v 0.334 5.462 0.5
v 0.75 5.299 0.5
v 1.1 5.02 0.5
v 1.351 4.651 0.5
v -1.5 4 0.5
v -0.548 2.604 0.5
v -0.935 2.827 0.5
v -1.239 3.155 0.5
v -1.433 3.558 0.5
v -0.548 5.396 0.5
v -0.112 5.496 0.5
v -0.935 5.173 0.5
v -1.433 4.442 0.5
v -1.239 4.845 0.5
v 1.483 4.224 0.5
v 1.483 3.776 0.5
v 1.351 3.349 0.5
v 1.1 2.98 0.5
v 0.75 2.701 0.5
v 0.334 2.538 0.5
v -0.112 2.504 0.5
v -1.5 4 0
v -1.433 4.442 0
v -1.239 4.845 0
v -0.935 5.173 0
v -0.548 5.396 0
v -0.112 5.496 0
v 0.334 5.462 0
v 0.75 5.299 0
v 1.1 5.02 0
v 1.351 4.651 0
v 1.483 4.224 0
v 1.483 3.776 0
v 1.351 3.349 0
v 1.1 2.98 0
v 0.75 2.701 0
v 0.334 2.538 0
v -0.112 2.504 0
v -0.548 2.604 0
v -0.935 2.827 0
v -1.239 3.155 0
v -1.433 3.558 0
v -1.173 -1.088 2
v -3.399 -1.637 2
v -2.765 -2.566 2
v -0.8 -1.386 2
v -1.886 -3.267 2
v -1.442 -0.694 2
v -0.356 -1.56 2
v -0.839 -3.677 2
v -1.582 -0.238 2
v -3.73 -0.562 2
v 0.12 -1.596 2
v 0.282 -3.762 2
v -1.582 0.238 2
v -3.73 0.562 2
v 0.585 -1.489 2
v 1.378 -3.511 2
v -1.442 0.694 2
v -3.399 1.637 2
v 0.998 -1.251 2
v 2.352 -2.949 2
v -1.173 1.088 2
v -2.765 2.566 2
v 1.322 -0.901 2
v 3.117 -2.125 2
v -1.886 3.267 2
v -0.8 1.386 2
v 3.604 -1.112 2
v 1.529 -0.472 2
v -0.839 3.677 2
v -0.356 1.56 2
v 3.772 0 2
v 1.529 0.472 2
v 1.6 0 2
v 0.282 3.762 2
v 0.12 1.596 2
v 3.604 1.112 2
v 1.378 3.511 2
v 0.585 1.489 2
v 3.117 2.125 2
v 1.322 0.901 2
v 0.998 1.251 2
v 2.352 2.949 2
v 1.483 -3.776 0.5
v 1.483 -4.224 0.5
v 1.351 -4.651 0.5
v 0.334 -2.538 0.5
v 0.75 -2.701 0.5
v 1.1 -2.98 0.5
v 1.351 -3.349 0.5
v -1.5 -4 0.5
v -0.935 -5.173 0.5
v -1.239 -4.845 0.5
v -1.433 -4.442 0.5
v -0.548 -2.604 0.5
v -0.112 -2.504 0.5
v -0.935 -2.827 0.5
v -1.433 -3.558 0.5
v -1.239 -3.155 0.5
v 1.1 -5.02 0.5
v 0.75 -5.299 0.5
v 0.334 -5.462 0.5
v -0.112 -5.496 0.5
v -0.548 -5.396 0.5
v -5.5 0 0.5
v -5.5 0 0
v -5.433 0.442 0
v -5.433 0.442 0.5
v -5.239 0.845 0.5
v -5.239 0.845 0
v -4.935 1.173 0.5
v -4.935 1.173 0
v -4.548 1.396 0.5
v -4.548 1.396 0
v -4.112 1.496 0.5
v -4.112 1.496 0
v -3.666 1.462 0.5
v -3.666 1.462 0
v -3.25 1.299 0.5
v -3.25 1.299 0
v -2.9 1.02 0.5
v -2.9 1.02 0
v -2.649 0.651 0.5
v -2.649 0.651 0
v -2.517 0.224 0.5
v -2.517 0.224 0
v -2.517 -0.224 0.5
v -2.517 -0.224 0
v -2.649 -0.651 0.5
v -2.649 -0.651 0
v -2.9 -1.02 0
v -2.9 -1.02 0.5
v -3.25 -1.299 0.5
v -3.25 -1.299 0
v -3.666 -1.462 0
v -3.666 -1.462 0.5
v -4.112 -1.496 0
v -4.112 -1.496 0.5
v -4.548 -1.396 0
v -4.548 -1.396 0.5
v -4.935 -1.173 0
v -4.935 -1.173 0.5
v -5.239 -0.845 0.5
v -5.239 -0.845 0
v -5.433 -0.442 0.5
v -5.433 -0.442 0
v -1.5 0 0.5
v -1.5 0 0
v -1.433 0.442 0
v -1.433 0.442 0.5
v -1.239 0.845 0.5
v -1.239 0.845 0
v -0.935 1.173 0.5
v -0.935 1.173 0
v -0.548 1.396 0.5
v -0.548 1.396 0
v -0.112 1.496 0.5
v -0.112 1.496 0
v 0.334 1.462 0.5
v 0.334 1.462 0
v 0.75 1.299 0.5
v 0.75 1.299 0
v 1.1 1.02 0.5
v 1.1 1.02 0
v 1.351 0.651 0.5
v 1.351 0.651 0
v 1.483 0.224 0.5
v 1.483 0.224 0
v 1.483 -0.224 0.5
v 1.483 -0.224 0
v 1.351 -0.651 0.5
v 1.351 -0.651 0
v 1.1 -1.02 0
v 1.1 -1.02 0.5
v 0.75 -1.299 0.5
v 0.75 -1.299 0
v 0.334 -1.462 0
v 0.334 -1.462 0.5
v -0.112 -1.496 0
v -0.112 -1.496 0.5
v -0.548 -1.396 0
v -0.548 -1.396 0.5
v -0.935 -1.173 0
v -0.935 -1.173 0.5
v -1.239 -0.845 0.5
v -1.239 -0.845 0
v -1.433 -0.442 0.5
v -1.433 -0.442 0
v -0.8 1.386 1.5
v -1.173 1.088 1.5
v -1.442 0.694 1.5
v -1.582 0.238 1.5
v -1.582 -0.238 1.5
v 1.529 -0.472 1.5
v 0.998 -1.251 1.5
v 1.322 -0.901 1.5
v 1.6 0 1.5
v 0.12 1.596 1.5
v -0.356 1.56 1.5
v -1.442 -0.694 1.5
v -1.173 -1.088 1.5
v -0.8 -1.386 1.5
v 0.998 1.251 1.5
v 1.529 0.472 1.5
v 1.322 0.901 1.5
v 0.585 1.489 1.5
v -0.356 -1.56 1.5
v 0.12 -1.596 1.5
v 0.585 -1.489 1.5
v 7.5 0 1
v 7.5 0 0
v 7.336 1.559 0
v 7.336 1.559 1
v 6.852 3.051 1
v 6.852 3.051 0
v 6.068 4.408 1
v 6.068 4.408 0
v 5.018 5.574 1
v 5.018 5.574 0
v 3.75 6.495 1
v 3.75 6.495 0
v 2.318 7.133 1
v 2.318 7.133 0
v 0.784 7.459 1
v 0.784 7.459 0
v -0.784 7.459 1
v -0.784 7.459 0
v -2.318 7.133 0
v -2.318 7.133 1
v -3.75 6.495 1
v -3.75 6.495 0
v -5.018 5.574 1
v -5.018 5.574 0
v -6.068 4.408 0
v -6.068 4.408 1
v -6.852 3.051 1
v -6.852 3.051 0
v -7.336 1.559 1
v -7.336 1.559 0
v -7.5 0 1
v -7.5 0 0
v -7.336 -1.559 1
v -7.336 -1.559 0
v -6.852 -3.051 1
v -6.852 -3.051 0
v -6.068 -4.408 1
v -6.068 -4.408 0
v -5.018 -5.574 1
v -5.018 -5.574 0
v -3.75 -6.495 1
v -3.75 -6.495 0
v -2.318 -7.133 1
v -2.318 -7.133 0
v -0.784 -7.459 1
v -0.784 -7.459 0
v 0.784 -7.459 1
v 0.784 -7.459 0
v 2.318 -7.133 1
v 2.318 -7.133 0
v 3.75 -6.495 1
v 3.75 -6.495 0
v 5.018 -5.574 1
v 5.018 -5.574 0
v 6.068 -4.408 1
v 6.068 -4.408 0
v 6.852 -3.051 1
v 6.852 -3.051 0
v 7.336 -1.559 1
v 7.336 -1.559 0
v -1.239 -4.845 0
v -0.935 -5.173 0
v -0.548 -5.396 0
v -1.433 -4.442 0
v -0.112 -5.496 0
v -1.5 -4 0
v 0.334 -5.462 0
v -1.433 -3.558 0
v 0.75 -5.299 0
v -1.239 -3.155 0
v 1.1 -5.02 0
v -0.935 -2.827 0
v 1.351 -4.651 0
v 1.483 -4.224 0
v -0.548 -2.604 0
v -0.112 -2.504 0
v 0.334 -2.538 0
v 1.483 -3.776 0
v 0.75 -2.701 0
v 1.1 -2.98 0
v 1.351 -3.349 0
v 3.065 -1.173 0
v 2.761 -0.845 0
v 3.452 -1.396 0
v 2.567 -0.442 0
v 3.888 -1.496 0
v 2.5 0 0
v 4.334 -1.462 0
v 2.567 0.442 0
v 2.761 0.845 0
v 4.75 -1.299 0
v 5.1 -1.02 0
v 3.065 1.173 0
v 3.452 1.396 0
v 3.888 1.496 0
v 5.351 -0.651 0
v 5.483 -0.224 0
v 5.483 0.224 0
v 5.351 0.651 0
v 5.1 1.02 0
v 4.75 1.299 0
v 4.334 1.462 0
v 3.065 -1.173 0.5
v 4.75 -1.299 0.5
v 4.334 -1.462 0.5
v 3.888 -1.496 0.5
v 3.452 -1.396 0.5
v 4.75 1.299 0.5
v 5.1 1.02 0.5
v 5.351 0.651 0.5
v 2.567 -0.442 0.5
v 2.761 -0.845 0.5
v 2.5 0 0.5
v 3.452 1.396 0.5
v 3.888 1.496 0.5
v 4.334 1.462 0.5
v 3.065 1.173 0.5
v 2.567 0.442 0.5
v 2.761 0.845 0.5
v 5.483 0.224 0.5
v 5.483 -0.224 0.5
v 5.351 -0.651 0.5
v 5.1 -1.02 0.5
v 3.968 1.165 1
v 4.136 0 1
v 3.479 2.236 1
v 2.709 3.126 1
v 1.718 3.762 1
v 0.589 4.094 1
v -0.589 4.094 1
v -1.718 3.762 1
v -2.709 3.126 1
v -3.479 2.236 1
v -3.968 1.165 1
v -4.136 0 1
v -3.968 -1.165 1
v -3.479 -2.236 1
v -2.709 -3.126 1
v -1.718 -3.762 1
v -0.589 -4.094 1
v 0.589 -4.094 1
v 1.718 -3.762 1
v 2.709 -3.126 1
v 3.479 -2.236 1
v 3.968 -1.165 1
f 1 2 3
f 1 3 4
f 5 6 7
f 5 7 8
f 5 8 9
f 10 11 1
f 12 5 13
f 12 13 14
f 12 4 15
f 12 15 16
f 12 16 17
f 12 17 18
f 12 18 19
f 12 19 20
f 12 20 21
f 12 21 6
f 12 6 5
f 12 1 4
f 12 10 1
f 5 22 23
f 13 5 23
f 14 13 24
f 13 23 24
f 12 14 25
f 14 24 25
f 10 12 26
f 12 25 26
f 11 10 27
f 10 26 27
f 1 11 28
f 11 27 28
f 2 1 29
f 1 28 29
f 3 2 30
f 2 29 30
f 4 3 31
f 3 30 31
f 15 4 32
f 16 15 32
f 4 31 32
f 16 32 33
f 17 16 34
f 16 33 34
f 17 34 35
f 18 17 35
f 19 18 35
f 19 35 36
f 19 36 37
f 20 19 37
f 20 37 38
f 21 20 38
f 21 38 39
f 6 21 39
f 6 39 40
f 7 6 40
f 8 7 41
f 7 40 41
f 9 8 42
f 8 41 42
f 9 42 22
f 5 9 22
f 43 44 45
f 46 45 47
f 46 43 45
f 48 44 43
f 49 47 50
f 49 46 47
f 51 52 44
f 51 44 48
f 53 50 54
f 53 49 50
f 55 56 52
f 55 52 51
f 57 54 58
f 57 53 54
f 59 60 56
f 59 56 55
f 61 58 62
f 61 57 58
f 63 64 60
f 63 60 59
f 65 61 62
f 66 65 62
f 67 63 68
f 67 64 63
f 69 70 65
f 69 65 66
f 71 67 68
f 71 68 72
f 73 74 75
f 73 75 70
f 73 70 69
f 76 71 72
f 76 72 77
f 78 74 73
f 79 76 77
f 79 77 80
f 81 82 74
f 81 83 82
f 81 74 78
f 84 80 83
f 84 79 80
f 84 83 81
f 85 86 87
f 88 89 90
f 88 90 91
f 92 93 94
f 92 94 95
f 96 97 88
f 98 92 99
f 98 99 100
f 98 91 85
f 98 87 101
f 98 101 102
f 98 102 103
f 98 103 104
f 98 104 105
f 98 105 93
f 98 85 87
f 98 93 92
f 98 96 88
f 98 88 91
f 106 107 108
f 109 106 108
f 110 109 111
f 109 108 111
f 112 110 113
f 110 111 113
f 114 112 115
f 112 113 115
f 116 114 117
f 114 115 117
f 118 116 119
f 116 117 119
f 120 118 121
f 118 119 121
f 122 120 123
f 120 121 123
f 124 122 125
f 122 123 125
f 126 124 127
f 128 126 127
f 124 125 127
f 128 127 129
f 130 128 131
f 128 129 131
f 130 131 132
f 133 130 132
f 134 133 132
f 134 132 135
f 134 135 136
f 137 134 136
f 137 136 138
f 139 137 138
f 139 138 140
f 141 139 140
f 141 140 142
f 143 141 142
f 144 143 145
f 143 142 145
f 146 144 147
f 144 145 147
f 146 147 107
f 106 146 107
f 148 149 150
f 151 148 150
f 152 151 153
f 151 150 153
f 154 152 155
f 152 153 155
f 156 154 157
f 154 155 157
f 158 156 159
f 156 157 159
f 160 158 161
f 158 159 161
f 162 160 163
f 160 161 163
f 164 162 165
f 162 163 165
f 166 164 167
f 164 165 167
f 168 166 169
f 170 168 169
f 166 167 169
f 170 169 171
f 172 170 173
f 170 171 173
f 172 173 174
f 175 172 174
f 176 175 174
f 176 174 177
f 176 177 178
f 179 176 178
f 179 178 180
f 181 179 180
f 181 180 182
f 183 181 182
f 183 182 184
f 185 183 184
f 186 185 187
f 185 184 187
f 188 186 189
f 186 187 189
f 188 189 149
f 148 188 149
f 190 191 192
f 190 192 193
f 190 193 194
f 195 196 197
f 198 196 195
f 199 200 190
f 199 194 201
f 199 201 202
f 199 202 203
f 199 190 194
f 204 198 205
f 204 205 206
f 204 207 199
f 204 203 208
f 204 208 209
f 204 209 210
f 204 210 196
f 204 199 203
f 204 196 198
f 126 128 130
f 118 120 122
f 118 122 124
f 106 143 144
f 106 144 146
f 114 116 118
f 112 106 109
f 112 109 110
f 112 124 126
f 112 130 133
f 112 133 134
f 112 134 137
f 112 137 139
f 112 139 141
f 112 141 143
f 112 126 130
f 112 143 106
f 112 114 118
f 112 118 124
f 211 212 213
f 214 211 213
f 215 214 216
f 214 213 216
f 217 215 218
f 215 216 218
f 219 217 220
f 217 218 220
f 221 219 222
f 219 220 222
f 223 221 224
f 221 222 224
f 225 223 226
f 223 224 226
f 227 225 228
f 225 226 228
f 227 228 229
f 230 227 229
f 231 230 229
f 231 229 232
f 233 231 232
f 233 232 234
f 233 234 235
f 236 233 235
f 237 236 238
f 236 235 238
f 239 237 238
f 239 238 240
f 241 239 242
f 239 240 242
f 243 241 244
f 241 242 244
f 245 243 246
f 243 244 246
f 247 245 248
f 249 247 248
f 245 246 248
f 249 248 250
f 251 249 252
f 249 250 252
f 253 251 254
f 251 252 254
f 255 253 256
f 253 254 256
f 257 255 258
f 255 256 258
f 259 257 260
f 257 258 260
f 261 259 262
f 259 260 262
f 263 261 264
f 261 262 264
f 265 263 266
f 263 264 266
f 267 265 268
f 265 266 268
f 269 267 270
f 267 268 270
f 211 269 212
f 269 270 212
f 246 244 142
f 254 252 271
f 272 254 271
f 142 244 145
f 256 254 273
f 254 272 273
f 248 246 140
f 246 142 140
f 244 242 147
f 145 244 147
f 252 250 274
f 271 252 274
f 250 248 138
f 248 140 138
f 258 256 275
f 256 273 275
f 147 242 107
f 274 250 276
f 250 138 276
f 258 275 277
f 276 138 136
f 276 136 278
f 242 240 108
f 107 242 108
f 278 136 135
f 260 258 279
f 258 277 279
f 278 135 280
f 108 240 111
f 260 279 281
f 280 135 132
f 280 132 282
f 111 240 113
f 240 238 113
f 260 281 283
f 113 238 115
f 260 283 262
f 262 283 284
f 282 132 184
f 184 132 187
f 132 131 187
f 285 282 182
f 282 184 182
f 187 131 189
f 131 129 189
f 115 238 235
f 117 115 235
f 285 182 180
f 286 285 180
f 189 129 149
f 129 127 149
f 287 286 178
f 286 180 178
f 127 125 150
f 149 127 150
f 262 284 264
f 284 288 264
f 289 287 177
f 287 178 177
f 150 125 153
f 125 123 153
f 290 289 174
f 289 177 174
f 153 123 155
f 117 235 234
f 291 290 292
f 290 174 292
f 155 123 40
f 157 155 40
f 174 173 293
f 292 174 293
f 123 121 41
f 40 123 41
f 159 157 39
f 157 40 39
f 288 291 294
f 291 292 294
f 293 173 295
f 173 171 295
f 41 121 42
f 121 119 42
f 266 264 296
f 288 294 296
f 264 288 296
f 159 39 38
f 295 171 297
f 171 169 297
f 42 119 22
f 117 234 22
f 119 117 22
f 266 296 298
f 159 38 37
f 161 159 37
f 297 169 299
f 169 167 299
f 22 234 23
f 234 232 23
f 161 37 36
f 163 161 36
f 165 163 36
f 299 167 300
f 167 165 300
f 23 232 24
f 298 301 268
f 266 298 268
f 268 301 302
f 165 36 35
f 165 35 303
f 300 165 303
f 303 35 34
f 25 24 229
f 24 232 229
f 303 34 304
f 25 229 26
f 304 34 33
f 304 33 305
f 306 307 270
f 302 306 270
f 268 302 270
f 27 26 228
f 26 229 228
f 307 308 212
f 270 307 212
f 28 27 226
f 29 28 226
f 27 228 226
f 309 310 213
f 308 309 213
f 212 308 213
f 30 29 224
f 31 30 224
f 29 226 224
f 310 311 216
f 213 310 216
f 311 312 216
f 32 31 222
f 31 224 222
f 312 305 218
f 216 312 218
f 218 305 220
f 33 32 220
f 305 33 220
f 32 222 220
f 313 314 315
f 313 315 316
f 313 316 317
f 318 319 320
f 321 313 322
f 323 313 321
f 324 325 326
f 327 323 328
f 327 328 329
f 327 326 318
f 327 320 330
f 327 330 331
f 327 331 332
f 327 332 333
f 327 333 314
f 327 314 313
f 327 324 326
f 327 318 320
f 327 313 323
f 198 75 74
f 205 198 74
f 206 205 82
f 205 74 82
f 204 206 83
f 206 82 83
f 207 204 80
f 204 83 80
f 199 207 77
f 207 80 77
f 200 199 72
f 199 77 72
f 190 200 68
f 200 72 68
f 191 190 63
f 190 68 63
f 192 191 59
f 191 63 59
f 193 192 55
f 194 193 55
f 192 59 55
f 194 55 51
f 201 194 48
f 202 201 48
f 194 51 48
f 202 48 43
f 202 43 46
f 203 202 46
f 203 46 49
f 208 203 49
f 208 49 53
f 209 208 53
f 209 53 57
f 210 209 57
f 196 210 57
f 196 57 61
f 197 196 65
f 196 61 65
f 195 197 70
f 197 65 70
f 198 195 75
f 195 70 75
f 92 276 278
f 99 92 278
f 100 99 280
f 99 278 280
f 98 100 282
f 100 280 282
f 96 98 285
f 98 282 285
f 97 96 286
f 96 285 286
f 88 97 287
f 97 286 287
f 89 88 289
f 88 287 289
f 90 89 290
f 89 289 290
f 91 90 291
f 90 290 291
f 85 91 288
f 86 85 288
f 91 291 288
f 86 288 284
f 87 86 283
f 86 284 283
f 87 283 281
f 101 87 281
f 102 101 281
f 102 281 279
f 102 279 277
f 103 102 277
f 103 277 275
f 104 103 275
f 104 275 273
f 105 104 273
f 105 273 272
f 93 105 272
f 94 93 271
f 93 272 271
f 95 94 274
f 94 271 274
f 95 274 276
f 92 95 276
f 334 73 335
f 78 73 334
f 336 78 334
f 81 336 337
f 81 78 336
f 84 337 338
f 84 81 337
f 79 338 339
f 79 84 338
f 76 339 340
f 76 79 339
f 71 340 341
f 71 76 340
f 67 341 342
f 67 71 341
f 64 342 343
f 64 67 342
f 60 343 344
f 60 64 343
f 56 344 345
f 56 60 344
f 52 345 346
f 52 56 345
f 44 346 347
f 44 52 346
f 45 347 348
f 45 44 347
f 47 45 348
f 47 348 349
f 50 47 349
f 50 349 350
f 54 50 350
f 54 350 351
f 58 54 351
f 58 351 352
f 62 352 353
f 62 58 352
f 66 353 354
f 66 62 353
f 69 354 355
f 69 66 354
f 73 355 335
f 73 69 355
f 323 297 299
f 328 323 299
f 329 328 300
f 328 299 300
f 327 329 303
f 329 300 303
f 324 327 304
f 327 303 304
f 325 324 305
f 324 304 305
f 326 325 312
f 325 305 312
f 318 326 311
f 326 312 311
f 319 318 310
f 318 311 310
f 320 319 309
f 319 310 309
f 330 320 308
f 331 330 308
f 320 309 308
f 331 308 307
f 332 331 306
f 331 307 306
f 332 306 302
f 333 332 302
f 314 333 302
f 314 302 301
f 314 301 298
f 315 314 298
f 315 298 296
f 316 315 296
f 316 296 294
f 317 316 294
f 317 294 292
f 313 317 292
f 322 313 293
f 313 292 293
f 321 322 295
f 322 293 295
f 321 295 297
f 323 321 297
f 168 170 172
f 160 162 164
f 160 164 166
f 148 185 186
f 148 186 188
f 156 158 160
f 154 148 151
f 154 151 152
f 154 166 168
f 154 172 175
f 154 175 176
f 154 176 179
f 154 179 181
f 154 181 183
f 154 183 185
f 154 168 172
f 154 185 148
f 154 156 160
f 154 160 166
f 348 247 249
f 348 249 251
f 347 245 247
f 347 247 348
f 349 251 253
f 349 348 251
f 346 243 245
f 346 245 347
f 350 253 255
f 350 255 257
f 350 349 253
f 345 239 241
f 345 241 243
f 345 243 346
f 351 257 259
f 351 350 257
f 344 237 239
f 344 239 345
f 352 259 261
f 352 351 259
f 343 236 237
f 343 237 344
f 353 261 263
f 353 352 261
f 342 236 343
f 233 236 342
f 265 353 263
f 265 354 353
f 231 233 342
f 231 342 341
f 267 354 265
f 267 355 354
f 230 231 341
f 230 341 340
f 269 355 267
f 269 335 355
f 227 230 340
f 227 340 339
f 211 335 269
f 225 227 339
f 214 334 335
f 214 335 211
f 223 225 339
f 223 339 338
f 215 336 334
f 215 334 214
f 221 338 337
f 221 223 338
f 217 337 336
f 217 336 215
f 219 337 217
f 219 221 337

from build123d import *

# Parameters (mm, degrees)
SKETCH1_R           = 7.5
BOSS_EXTRUDE1_DEPTH = 1
SKETCH4_R           = 4.5
BOSS_EXTRUDE2_DEPTH = 1
SKETCH5_R           = 1.6
CUT_EXTRUDE2_DEPTH  = 0.5
CHAMFER4_SIZE       = 2
CHAMFER4_SIZE_2     = 0.727940469
SKETCH6_R           = 1.5
CUT_EXTRUDE3_DEPTH  = 0.5


with BuildPart() as part:
    # Sketch1 → Boss-Extrude1 (new body)
    with BuildSketch(Plane.XY):
        Circle(SKETCH1_R)
    extrude(amount=BOSS_EXTRUDE1_DEPTH)

    # Sketch4 → Boss-Extrude2 (add)
    with BuildSketch(Plane.XY.offset(1)):
        Circle(SKETCH4_R)
    extrude(amount=BOSS_EXTRUDE2_DEPTH)

    # Sketch5 → Cut-Extrude2 (cut)
    with BuildSketch(Plane.XY.offset(2)):
        Circle(SKETCH5_R)
    extrude(amount=-CUT_EXTRUDE2_DEPTH, mode=Mode.SUBTRACT)

    # Chamfer4
    # the kernel refuses this chamfer: 2, 0.727940469 mm, written as the material it takes off along each edge
    with BuildSketch(Plane(origin=(0, 0, 2), x_dir=(1, 0, 0), z_dir=(0, -1, 0))) as chamfer4_piece_1_section:
        Polygon((4.5, -CHAMFER4_SIZE), (4.5 - CHAMFER4_SIZE_2, 0), (4.5, 0), align=None)
    chamfer4_piece_1 = revolve(axis=Axis((0, 0, 2), (0, 0, 1)), mode=Mode.PRIVATE)
    chamfer4_piece_1 = split(chamfer4_piece_1, bisect_by=Plane(origin=(-3.964304639, 0, 1), z_dir=(0, 0, 1)), keep=Keep.TOP, mode=Mode.PRIVATE)
    add(chamfer4_piece_1, mode=Mode.SUBTRACT)

    # Sketch6 → Cut-Extrude3 (cut)
    with BuildSketch(Plane(origin=(0, 0, 0), x_dir=(-1, 0, 0), z_dir=(0, 0, -1))):
        Circle(SKETCH6_R)
        with Locations((-4, 0)):
            Circle(SKETCH6_R)
        with Locations((0, 4)):
            Circle(SKETCH6_R)
        with Locations((4, 0)):
            Circle(SKETCH6_R)
        with Locations((0, -4)):
            Circle(SKETCH6_R)
    extrude(amount=-CUT_EXTRUDE3_DEPTH, mode=Mode.SUBTRACT)


solid = part.part
